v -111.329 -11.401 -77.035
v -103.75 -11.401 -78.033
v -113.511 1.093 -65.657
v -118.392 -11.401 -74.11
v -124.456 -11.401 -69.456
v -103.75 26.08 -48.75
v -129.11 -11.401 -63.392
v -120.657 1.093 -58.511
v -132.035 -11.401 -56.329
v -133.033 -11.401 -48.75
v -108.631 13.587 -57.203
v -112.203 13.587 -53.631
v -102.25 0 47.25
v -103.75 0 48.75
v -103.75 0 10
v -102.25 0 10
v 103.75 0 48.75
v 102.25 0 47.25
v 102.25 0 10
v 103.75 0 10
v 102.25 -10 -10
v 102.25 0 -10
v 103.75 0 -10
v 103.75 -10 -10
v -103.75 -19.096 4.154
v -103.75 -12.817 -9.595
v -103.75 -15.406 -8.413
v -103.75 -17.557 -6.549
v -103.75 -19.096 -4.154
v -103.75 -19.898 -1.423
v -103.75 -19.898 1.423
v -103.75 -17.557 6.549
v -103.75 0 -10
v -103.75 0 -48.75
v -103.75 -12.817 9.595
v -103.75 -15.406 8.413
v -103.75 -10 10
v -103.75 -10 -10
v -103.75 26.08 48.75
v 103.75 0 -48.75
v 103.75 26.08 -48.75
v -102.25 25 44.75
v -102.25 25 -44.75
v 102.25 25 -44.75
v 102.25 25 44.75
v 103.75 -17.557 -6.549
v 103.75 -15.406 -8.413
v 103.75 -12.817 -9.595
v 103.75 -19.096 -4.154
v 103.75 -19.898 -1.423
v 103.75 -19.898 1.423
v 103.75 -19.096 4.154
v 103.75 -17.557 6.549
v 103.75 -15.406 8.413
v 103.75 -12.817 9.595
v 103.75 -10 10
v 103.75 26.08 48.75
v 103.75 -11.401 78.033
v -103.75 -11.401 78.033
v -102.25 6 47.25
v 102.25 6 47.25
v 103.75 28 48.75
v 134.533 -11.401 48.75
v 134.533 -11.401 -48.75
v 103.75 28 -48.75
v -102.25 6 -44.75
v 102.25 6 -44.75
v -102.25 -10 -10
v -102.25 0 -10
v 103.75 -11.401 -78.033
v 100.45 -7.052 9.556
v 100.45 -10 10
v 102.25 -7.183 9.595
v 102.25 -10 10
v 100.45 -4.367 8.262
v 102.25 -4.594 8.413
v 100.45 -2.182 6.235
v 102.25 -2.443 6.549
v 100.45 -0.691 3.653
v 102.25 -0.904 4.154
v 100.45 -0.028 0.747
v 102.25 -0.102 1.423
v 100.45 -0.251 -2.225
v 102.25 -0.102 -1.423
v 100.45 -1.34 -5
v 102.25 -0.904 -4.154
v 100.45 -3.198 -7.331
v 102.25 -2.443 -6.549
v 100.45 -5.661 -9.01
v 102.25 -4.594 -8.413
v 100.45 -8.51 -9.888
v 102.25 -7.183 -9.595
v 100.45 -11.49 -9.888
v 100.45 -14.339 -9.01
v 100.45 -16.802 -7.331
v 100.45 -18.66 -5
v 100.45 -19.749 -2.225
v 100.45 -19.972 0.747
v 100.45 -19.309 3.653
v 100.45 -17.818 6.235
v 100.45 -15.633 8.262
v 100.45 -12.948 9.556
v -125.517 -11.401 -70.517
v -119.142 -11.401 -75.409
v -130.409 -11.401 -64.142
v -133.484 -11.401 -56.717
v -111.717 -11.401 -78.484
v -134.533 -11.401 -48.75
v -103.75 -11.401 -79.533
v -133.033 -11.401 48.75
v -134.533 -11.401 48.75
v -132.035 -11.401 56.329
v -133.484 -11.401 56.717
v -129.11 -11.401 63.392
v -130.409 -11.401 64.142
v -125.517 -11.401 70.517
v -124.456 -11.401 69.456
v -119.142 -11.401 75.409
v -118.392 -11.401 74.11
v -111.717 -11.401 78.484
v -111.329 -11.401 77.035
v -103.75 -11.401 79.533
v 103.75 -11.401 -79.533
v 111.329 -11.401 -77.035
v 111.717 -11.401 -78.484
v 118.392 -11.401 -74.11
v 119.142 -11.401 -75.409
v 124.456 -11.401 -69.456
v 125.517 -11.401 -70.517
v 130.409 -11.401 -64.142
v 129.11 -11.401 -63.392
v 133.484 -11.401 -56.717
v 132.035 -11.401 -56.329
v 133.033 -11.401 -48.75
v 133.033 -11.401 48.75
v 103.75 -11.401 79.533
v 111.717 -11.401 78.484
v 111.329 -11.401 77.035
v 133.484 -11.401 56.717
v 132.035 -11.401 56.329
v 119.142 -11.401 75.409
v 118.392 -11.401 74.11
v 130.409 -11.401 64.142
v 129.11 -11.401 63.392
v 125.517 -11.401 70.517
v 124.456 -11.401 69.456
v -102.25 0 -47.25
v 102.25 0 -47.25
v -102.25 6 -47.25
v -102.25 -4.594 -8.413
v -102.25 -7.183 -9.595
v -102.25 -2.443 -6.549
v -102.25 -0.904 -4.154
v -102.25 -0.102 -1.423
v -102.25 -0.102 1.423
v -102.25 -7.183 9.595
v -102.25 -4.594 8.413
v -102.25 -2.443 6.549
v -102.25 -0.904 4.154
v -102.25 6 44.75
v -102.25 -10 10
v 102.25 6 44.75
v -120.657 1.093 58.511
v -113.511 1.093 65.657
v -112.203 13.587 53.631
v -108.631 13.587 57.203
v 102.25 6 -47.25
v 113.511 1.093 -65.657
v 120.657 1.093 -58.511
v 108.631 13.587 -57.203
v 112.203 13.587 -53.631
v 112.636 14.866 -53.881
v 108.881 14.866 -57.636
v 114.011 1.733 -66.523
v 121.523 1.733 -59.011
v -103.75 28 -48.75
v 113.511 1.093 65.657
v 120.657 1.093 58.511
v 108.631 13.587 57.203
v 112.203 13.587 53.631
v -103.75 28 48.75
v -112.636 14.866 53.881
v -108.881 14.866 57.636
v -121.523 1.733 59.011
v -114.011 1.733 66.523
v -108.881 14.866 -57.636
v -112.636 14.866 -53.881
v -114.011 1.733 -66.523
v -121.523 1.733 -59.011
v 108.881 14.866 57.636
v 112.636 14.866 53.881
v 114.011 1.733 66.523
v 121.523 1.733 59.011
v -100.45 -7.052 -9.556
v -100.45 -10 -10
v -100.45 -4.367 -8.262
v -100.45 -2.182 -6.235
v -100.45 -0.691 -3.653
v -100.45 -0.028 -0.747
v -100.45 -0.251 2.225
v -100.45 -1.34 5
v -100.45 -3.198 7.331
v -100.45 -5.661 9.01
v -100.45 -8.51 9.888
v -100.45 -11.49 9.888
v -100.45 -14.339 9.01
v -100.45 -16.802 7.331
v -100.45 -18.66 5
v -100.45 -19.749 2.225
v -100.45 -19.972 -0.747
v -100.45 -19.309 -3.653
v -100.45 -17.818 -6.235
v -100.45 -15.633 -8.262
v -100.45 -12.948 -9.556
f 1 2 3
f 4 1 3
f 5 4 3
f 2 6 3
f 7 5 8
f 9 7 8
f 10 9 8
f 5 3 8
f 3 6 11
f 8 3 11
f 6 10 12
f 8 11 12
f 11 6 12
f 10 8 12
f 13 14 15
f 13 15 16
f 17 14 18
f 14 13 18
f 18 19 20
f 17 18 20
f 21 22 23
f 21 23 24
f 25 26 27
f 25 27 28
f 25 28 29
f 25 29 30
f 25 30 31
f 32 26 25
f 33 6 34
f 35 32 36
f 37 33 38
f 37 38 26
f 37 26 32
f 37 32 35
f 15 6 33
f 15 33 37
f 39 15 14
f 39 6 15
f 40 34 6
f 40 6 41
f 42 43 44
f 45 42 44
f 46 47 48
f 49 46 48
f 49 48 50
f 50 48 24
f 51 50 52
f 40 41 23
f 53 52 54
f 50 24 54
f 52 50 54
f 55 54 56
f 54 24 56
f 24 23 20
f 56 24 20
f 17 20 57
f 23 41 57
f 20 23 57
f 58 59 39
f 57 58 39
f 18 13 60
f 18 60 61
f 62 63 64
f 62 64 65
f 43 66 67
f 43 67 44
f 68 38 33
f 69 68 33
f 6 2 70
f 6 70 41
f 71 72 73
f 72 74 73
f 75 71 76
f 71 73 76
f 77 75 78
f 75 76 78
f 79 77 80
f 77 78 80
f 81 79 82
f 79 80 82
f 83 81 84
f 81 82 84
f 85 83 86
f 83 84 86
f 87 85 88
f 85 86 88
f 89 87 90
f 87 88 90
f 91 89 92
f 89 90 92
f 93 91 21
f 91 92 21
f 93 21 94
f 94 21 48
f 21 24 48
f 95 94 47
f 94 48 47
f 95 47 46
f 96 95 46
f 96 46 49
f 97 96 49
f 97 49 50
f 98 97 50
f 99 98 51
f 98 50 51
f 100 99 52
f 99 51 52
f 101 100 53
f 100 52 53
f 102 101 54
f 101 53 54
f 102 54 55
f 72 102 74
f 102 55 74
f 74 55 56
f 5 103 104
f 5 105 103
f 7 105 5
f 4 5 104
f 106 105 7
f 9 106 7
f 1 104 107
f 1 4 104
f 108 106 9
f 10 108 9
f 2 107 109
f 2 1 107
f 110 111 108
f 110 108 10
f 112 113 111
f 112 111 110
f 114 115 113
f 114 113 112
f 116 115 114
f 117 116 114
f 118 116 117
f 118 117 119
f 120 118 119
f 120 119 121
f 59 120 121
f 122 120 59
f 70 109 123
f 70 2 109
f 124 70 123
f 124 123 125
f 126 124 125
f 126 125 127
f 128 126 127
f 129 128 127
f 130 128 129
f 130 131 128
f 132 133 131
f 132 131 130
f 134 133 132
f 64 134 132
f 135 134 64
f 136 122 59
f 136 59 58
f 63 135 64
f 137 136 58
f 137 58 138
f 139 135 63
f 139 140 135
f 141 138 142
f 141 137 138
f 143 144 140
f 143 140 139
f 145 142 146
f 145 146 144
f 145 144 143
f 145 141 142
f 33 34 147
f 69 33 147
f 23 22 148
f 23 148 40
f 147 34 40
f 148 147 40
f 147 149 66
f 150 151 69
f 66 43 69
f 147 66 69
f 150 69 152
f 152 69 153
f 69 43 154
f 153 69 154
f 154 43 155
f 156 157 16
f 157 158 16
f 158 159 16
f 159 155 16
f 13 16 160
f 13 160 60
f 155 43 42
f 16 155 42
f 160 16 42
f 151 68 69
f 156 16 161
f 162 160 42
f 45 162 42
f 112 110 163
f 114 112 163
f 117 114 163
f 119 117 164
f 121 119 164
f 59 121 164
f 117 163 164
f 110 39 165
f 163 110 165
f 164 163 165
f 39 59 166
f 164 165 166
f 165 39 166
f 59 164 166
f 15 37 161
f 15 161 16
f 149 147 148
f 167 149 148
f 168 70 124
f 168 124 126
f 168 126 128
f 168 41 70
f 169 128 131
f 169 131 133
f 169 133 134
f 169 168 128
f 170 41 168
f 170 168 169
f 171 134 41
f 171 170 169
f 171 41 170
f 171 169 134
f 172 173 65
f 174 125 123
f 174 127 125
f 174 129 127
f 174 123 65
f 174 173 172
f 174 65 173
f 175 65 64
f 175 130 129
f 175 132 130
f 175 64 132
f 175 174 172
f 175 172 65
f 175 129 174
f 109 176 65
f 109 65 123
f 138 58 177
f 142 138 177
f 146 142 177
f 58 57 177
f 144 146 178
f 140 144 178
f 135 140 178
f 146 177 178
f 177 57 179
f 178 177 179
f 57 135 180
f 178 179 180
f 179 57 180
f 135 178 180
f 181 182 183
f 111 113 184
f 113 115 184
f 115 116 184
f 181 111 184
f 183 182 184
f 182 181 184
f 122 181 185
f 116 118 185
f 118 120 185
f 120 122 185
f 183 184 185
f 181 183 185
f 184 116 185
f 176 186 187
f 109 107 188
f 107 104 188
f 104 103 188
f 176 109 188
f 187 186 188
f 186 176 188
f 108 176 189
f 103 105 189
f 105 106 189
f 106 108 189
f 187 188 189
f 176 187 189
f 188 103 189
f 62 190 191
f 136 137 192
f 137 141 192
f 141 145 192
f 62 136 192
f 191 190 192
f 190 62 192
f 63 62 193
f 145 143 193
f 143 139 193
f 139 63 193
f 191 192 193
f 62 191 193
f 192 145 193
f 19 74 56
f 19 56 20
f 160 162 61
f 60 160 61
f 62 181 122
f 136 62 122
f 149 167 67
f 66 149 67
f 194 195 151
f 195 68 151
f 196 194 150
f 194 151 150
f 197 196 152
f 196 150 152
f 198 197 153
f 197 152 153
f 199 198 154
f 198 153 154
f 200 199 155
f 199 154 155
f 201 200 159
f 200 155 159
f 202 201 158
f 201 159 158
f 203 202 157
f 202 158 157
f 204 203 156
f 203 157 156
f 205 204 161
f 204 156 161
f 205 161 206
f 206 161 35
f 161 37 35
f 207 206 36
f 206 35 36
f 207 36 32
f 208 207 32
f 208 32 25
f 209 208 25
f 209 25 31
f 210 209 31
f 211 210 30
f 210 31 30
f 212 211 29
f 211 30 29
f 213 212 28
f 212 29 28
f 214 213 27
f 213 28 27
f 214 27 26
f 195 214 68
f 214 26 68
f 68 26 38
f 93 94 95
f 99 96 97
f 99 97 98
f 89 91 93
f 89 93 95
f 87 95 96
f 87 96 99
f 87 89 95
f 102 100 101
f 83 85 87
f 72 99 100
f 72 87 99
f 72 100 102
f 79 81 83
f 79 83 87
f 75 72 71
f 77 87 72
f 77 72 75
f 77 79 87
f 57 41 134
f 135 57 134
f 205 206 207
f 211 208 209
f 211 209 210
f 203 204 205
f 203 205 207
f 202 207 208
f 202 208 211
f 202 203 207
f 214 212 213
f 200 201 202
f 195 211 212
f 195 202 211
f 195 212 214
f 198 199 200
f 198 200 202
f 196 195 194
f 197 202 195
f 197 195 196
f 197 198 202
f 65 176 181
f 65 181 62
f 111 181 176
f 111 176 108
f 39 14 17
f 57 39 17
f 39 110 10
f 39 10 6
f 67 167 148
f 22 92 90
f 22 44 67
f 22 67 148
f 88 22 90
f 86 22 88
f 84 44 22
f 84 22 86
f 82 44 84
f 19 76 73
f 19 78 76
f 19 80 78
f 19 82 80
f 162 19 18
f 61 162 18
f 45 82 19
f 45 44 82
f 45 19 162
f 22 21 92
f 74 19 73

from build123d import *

# Parameters (mm, degrees)
CROQUIS1_W               = 207.5
CROQUIS1_H               = 97.5
CROQUIS1_W_2             = 204.5
CROQUIS1_H_2             = 94.5
SALIENTE_EXTRUIR1_DEPTH  = 25
CROQUIS2_W               = 207.5
CROQUIS2_H               = 97.5
SALIENTE_EXTRUIR2_DEPTH  = 3
SALIENTE_EXTRUIR3_DEPTH  = 207.5
SALIENTE_EXTRUIR4_DEPTH  = 97.5
REVOLUCI_N1_ANGLE        = 90
REVOLUCI_N2_ANGLE        = 90
REVOLUCI_N3_ANGLE        = 90
REVOLUCI_N4_ANGLE        = 90
SALIENTE_EXTRUIR5_DEPTH  = 97.5
CROQUIS10_W              = 2.5
CROQUIS10_H              = 19
SALIENTE_EXTRUIR6_DEPTH  = 204.5
CROQUIS11_W              = 2.5
CROQUIS11_H              = 19
SALIENTE_EXTRUIR7_DEPTH  = 204.5
CROQUIS13_R              = 10
SALIENTE_EXTRUIR8_DEPTH  = 0.3
CROQUIS14_R              = 10
SALIENTE_EXTRUIR9_DEPTH  = 1.5
CROQUIS15_W              = 20
CROQUIS15_H              = 20
SALIENTE_EXTRUIR10_DEPTH = 1.5
SALIENTE_EXTRUIR11_DEPTH = 1.5
CROQUIS17_R              = 10
SALIENTE_EXTRUIR12_DEPTH = 0.3
CROQUIS18_R              = 10
SALIENTE_EXTRUIR13_DEPTH = 1.5
CROQUIS19_R              = 10
SALIENTE_EXTRUIR14_DEPTH = 1.5


with BuildPart() as part:
    # Croquis1 → Saliente-Extruir1 (new body)
    with BuildSketch(Plane(origin=(0, 0, 0), x_dir=(1, 0, 0), z_dir=(0, 1, 0))):
        Rectangle(CROQUIS1_W, CROQUIS1_H)
        Rectangle(CROQUIS1_W_2, CROQUIS1_H_2, mode=Mode.SUBTRACT)
    extrude(amount=SALIENTE_EXTRUIR1_DEPTH)

    # Croquis2 → Saliente-Extruir2 (add)
    with BuildSketch(Plane(origin=(0, 25, 0), x_dir=(1, 0, 0), z_dir=(0, 1, 0))):
        Rectangle(CROQUIS2_W, CROQUIS2_H)
    extrude(amount=SALIENTE_EXTRUIR2_DEPTH)

    # Croquis3 → Saliente-Extruir3 (add)
    with BuildSketch(Plane.ZY.offset(103.75)):
        Polygon((48.75, 28), (79.533073766, -11.40053768), (78.033073766, -11.40053768), (48.75, 26.080087552), align=None)
        Polygon((-48.75, 28), (-79.533073766, -11.40053768), (-78.033073766, -11.40053768), (-48.75, 26.080087552), align=None)
    extrude(amount=-SALIENTE_EXTRUIR3_DEPTH)

    # Croquis4 → Saliente-Extruir4 (add)
    with BuildSketch(Plane.XY.offset(48.75)):
        Polygon((-103.75, 28), (-134.533073766, -11.40053768), (-133.033073766, -11.40053768), (-102.25, 28), align=None)
    extrude(amount=-SALIENTE_EXTRUIR4_DEPTH)

    # Croquis5 → Revolución1 (revolve)
    with BuildSketch(Plane.XY.offset(48.75)):
        Polygon((-103.75, 28), (-134.533073766, -11.40053768), (-133.033073766, -11.40053768), (-103.75, 26.080087552), align=None)
    revolve(axis=Axis((-103.75, 26.080087552, 48.75), (0, 1, 0)), revolution_arc=REVOLUCI_N1_ANGLE)

    # Croquis6 → Revolución2 (revolve)
    with BuildSketch(Plane.ZY.offset(103.75)):
        Polygon((-48.75, 28), (-79.533073766, -11.40053768), (-78.033073766, -11.40053768), (-48.75, 26.080087552), align=None)
    revolve(axis=Axis((-103.75, 26.080087552, -48.75), (0, 1, 0)), revolution_arc=REVOLUCI_N2_ANGLE)

    # Croquis7 → Revolución3 (revolve)
    with BuildSketch(Plane(origin=(103.75, 0, 0), x_dir=(0, 0, -1), z_dir=(1, 0, 0))):
        Polygon((48.75, 26.080087552), (48.75, 28), (79.533073766, -11.40053768), (78.033073766, -11.40053768), align=None)
    revolve(axis=Axis((103.75, 26.080087552, -48.75), (0, -1, 0)), revolution_arc=REVOLUCI_N3_ANGLE)

    # Croquis8 → Revolución4 (revolve)
    with BuildSketch(Plane(origin=(103.75, 0, 0), x_dir=(0, 0, -1), z_dir=(1, 0, 0))):
        Polygon((-48.75, 28), (-79.533073766, -11.40053768), (-78.033073766, -11.40053768), (-48.75, 26.080087552), align=None)
    revolve(axis=Axis((103.75, 26.080087552, 48.75), (0, 1, 0)), revolution_arc=REVOLUCI_N4_ANGLE)

    # Croquis9 → Saliente-Extruir5 (add)
    with BuildSketch(Plane(origin=(0, 0, 48.75), x_dir=(-1, 0, 0), z_dir=(0, 0, -1))):
        Polygon((-103.75, 28), (-103.75, 26.080087552), (-133.033073766, -11.40053768), (-134.533073766, -11.40053768), align=None)
    extrude(amount=SALIENTE_EXTRUIR5_DEPTH)

    # Croquis10 → Saliente-Extruir6 (add)
    with BuildSketch(Plane.ZY.offset(-102.25)):
        with Locations((46, 15.5)):
            Rectangle(CROQUIS10_W, CROQUIS10_H)
    extrude(amount=SALIENTE_EXTRUIR6_DEPTH)

    # Croquis11 → Saliente-Extruir7 (add)
    with BuildSketch(Plane.ZY.offset(-102.25)):
        with Locations((-46, 15.5)):
            Rectangle(CROQUIS11_W, CROQUIS11_H)
    extrude(amount=SALIENTE_EXTRUIR7_DEPTH)



with BuildPart() as body_2:
    # Croquis13 → Saliente-Extruir8 (new body)
    with BuildSketch(Plane(origin=(-102.25, 0, 0), x_dir=(0, 0, -1), z_dir=(1, 0, 0))):
        with Locations((0, -10)):
            Circle(CROQUIS13_R)
    extrude(amount=SALIENTE_EXTRUIR8_DEPTH)

    # Croquis14 → Saliente-Extruir9 (add)
    with BuildSketch(Plane.ZY.offset(102.25)):
        with Locations((0, -10)):
            Circle(CROQUIS14_R)
    extrude(amount=SALIENTE_EXTRUIR9_DEPTH)


with BuildPart() as part_1:
    add(part.part)

    add(body_2.part)  # Saliente-Extruir10 merges body 2
    # Croquis15 → Saliente-Extruir10 (add)
    with BuildSketch(Plane.ZY.offset(103.75)):
        Rectangle(CROQUIS15_W, CROQUIS15_H)
    extrude(amount=-SALIENTE_EXTRUIR10_DEPTH)

    # Croquis16 → Saliente-Extruir11 (add)
    with BuildSketch(Plane.ZY.offset(-102.25)):
        with BuildLine():
            Line((10, -10), (0, -10))
            Line((0, -10), (-10, -10))
            ThreePointArc((-10, -10), (0, -20), (10, -10))
        make_face()
        with BuildLine():
            ThreePointArc((10, -10), (7.071067812, -2.928932188), (0, 0))
            Line((0, 0), (0, -10))
            Line((0, -10), (10, -10))
        make_face()
        with BuildLine():
            Line((0, -10), (0, 0))
            ThreePointArc((0, 0), (-7.071067812, -2.928932188), (-10, -10))
            Line((-10, -10), (0, -10))
        make_face()
        with BuildLine():
            ThreePointArc((-10, -10), (-7.071067812, -2.928932188), (0, 0))
            Line((0, 0), (-10, 0))
            Line((-10, 0), (-10, -10))
        make_face()
        with BuildLine():
            Line((10, 0), (0, 0))
            ThreePointArc((0, 0), (7.071067812, -2.928932188), (10, -10))
            Line((10, -10), (10, 0))
        make_face()
        Polygon((-10, 0), (0, 0), (10, 0), (10, 10), (-10, 10), align=None)
    extrude(amount=-SALIENTE_EXTRUIR11_DEPTH)

    # Croquis17 → Saliente-Extruir12 (add)
    with BuildSketch(Plane.ZY.offset(-102.25)):
        with Locations((0, -10)):
            Circle(CROQUIS17_R)
    extrude(amount=SALIENTE_EXTRUIR12_DEPTH)

    # Croquis18 → Saliente-Extruir13 (add)
    with BuildSketch(Plane.ZY.offset(-101.95)):
        with Locations((0, -10)):
            Circle(CROQUIS18_R)
    extrude(amount=SALIENTE_EXTRUIR13_DEPTH)

    # Croquis19 → Saliente-Extruir14 (add)
    with BuildSketch(Plane(origin=(-101.95, 0, 0), x_dir=(0, 0, -1), z_dir=(1, 0, 0))):
        with Locations((0, -10)):
            Circle(CROQUIS19_R)
    extrude(amount=SALIENTE_EXTRUIR14_DEPTH)


solid = part_1.part
